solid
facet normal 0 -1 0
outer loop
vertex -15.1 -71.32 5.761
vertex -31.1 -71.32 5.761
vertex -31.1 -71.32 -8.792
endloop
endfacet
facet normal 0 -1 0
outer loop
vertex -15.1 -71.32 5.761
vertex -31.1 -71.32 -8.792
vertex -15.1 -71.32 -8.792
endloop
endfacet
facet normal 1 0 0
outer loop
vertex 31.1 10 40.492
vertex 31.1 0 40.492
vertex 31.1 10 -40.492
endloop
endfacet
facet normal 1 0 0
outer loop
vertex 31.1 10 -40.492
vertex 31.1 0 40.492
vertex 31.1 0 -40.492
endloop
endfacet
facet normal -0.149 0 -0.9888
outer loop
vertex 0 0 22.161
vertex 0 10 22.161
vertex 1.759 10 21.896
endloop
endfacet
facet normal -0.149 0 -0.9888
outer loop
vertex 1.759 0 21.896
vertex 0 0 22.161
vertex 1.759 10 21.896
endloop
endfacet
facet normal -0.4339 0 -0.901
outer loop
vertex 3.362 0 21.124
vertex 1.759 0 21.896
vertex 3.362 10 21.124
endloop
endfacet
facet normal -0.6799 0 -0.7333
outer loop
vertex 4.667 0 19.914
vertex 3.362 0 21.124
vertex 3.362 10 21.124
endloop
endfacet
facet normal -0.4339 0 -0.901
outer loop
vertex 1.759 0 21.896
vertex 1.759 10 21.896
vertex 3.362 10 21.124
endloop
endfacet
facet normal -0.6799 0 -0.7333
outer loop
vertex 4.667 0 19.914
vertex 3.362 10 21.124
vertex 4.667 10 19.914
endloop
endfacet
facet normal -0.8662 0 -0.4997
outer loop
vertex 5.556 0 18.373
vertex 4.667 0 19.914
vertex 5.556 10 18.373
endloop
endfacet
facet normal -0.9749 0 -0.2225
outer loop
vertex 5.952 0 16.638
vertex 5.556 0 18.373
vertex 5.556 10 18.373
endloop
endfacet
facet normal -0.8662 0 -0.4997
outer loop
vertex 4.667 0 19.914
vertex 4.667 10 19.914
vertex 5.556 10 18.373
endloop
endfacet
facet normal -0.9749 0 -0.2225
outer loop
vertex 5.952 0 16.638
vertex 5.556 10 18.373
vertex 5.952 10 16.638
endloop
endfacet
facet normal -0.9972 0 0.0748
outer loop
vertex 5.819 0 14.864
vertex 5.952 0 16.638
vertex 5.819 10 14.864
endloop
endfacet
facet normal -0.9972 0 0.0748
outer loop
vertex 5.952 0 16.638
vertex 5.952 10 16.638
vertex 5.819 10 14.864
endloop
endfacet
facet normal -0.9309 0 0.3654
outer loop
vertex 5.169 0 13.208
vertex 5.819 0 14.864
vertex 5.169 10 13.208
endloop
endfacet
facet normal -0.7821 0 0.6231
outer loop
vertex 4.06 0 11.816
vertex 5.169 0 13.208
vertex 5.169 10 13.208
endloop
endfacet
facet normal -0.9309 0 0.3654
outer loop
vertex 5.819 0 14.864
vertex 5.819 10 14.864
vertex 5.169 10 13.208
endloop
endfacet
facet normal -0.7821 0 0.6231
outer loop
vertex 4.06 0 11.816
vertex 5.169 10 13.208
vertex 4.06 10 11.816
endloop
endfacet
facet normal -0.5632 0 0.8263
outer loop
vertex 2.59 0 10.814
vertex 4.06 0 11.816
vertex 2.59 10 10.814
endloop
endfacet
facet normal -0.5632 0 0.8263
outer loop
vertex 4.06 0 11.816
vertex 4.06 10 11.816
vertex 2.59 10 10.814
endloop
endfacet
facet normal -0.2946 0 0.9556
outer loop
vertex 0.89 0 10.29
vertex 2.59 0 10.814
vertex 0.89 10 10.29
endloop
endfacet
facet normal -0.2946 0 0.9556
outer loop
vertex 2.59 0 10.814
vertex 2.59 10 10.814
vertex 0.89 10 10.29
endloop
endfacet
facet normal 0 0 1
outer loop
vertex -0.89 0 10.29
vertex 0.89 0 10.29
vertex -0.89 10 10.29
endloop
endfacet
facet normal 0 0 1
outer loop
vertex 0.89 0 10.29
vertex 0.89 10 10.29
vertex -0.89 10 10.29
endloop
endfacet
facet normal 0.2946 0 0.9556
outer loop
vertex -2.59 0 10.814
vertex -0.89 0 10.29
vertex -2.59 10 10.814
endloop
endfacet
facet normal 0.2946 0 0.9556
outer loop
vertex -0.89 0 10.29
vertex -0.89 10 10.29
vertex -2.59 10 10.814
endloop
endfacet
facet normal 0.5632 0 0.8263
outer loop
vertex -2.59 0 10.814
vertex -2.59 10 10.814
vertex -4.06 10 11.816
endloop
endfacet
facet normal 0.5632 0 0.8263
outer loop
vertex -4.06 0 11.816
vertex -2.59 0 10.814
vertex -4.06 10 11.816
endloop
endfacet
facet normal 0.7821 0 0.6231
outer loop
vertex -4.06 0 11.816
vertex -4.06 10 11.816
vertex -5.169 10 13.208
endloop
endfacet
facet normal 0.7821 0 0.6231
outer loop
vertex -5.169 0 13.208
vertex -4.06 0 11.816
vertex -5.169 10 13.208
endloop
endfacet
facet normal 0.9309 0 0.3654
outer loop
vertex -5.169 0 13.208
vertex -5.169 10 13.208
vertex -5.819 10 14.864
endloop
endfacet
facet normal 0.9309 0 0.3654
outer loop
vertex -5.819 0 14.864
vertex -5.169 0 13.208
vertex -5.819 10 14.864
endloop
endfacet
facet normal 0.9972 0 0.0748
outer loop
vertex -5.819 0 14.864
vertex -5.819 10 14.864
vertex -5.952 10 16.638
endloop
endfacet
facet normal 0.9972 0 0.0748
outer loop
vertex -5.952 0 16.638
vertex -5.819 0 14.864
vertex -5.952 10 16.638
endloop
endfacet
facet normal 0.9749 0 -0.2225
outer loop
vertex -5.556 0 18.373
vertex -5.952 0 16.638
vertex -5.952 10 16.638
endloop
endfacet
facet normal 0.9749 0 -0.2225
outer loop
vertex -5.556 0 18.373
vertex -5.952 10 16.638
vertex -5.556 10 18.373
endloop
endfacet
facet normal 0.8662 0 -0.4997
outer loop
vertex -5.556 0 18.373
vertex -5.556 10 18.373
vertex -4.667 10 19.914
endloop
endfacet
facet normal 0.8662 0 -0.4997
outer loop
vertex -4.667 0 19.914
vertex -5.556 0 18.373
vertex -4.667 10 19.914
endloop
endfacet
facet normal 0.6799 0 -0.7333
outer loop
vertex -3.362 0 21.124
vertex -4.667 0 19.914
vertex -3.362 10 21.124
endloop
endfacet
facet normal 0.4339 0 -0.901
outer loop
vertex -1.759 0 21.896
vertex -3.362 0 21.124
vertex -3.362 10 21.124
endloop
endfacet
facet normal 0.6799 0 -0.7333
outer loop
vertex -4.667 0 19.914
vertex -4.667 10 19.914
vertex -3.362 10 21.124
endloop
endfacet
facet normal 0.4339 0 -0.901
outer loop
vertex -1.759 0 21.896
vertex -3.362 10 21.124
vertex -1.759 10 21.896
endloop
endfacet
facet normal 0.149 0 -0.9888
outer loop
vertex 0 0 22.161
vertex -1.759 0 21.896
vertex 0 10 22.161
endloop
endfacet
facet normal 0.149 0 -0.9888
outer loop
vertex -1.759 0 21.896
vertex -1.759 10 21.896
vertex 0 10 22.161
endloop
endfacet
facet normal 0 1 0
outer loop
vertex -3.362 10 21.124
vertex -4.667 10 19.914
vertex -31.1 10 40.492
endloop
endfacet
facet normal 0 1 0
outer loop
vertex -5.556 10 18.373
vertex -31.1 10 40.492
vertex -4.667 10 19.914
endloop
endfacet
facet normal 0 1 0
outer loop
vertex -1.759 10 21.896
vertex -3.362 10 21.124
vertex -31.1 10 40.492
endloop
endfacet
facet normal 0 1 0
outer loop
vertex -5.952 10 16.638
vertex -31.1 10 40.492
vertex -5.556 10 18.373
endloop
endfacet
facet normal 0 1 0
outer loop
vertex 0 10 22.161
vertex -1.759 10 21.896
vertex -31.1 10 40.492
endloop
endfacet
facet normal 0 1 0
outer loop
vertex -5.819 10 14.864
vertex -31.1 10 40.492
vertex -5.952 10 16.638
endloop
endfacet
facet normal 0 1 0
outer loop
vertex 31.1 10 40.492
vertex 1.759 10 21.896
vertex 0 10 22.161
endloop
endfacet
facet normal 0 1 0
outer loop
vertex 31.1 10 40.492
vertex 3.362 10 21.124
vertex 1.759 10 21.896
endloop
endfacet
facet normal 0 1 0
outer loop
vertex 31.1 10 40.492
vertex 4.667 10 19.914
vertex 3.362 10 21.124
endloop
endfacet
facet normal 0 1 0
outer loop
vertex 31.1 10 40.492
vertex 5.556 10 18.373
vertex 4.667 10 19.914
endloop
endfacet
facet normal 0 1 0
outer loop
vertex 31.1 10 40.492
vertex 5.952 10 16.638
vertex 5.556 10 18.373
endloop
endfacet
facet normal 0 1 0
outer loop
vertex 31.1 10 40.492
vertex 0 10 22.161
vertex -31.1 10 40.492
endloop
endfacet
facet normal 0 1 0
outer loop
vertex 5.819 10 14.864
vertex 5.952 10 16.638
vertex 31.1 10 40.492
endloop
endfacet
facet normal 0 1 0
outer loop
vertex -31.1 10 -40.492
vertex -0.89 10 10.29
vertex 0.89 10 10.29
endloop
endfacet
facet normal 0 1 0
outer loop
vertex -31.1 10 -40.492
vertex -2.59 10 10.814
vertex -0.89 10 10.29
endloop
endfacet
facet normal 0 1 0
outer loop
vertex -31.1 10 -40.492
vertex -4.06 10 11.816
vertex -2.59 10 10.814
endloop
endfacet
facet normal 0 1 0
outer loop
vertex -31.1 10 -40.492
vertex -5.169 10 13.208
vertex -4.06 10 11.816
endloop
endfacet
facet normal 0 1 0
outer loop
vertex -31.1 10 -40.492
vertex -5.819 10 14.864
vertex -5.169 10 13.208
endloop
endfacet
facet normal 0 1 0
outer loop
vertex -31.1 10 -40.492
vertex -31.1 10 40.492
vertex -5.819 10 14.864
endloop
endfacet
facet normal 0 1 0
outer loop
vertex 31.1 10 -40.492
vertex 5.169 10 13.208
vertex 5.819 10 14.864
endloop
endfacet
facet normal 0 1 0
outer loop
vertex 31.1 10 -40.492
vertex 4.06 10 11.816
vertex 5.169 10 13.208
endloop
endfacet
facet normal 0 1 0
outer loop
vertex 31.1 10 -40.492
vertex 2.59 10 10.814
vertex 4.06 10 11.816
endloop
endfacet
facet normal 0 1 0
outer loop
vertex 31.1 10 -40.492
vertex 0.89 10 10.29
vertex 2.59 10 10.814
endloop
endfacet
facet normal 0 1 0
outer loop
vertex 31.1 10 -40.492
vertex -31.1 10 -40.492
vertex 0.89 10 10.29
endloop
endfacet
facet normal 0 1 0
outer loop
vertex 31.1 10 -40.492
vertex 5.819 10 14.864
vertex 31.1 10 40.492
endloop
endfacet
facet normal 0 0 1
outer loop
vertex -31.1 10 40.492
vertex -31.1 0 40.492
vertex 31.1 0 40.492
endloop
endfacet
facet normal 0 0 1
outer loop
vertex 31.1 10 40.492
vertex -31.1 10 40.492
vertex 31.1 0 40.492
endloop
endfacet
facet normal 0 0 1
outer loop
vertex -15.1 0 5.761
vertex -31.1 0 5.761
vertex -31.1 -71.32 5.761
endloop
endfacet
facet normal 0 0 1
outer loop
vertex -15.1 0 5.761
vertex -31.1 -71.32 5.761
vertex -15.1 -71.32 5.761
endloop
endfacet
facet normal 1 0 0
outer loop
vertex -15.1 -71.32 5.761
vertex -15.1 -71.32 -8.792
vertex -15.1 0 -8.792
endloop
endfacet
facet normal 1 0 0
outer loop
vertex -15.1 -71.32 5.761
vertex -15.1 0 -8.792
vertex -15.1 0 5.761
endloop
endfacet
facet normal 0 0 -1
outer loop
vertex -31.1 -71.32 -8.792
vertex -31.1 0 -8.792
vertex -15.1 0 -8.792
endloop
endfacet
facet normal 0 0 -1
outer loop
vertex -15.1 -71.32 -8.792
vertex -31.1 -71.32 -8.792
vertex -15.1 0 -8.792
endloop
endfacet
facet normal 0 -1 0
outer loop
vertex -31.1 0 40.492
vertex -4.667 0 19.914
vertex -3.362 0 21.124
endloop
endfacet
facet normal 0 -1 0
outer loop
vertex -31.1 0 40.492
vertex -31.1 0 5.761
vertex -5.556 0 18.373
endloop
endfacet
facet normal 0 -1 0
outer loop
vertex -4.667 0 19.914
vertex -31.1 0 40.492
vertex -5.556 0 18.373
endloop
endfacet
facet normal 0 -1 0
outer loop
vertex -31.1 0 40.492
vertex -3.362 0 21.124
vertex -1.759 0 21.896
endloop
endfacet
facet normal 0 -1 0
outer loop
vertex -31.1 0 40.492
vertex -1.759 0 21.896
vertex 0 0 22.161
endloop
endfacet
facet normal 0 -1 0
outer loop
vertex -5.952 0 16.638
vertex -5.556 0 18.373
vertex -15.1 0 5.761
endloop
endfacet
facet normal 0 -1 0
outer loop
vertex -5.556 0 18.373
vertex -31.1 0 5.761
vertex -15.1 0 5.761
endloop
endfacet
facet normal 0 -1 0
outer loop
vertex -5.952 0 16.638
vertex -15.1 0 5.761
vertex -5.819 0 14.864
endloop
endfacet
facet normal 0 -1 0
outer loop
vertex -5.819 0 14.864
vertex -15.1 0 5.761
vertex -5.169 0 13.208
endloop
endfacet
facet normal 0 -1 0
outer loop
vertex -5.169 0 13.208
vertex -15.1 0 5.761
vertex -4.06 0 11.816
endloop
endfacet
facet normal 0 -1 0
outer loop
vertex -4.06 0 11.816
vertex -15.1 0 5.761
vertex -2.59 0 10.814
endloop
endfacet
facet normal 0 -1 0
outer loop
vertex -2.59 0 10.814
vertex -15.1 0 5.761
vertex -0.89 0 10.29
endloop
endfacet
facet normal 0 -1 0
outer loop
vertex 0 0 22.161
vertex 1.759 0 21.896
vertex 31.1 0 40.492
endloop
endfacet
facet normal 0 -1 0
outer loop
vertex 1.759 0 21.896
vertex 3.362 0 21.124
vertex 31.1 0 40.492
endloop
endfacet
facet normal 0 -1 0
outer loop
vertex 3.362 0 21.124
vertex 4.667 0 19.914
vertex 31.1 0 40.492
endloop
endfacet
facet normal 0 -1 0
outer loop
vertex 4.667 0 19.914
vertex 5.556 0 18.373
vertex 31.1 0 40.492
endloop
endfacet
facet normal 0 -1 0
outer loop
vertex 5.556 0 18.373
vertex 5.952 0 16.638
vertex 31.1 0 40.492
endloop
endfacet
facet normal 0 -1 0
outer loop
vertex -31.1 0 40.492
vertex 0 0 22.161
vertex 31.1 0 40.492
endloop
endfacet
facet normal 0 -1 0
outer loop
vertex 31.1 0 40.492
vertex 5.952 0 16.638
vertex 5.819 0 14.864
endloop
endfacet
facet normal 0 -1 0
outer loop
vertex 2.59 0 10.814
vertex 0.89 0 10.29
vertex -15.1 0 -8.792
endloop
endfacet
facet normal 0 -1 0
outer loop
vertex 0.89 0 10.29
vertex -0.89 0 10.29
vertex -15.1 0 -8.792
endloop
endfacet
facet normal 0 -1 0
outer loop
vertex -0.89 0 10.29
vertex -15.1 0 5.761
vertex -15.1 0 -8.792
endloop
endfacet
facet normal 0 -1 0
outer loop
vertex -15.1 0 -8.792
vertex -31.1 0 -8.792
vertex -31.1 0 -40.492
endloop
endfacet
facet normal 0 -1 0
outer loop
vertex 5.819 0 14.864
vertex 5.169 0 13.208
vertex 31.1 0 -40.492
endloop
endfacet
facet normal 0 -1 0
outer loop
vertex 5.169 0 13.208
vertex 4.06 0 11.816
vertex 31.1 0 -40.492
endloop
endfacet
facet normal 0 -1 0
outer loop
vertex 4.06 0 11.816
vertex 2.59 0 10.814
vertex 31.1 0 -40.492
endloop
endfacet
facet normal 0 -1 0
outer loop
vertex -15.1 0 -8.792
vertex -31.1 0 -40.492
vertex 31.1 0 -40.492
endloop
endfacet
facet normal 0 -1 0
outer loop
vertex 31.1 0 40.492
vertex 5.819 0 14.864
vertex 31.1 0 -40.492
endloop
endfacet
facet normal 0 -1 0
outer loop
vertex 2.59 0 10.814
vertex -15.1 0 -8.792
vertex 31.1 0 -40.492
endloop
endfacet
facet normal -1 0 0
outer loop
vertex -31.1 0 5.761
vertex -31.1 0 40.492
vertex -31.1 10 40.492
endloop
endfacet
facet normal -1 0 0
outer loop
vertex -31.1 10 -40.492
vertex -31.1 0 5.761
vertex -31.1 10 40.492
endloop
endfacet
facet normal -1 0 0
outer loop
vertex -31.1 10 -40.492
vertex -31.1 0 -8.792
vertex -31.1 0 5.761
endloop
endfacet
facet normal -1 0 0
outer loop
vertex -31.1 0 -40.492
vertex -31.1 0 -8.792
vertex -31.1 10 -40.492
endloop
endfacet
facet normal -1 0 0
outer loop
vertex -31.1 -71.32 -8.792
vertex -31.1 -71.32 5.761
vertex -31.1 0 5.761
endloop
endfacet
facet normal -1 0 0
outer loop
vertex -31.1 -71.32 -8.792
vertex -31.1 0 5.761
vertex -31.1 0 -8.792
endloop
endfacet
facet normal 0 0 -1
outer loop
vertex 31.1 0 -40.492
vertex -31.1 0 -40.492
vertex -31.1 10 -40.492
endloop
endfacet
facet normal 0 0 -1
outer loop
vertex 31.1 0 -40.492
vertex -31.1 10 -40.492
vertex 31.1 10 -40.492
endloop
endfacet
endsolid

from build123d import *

# Parameters (mm, degrees)
SKETCH1_W           = 62.2
SKETCH1_H           = 80.98413
BOSS_EXTRUDE1_DEPTH = 10
SKETCH2_R           = 5.969
CUT_EXTRUDE1_DEPTH  = 10
SKETCH3_W           = 16
SKETCH3_H           = 14.55264
BOSS_EXTRUDE2_DEPTH = 71.32


with BuildPart() as part:
    # Sketch1 → Boss-Extrude1 (new body)
    with BuildSketch(Plane(origin=(0, 0, 0), x_dir=(1, 0, 0), z_dir=(0, 1, 0))):
        Rectangle(SKETCH1_W, SKETCH1_H)
    extrude(amount=BOSS_EXTRUDE1_DEPTH)

    # Sketch2 → Cut-Extrude1 (cut)
    with BuildSketch(Plane(origin=(0, 10, 0), x_dir=(1, 0, 0), z_dir=(0, 1, 0))):
        with Locations(Location((0, -16.192065, 0), (0, 0, 270))):
            Circle(SKETCH2_R)
    extrude(amount=-CUT_EXTRUDE1_DEPTH, mode=Mode.SUBTRACT)

    # Sketch3 → Boss-Extrude2 (add)
    with BuildSketch(Plane.XZ):
        with Locations((-23.1, -1.515745)):
            Rectangle(SKETCH3_W, SKETCH3_H)
    extrude(amount=BOSS_EXTRUDE2_DEPTH)


solid = part.part
